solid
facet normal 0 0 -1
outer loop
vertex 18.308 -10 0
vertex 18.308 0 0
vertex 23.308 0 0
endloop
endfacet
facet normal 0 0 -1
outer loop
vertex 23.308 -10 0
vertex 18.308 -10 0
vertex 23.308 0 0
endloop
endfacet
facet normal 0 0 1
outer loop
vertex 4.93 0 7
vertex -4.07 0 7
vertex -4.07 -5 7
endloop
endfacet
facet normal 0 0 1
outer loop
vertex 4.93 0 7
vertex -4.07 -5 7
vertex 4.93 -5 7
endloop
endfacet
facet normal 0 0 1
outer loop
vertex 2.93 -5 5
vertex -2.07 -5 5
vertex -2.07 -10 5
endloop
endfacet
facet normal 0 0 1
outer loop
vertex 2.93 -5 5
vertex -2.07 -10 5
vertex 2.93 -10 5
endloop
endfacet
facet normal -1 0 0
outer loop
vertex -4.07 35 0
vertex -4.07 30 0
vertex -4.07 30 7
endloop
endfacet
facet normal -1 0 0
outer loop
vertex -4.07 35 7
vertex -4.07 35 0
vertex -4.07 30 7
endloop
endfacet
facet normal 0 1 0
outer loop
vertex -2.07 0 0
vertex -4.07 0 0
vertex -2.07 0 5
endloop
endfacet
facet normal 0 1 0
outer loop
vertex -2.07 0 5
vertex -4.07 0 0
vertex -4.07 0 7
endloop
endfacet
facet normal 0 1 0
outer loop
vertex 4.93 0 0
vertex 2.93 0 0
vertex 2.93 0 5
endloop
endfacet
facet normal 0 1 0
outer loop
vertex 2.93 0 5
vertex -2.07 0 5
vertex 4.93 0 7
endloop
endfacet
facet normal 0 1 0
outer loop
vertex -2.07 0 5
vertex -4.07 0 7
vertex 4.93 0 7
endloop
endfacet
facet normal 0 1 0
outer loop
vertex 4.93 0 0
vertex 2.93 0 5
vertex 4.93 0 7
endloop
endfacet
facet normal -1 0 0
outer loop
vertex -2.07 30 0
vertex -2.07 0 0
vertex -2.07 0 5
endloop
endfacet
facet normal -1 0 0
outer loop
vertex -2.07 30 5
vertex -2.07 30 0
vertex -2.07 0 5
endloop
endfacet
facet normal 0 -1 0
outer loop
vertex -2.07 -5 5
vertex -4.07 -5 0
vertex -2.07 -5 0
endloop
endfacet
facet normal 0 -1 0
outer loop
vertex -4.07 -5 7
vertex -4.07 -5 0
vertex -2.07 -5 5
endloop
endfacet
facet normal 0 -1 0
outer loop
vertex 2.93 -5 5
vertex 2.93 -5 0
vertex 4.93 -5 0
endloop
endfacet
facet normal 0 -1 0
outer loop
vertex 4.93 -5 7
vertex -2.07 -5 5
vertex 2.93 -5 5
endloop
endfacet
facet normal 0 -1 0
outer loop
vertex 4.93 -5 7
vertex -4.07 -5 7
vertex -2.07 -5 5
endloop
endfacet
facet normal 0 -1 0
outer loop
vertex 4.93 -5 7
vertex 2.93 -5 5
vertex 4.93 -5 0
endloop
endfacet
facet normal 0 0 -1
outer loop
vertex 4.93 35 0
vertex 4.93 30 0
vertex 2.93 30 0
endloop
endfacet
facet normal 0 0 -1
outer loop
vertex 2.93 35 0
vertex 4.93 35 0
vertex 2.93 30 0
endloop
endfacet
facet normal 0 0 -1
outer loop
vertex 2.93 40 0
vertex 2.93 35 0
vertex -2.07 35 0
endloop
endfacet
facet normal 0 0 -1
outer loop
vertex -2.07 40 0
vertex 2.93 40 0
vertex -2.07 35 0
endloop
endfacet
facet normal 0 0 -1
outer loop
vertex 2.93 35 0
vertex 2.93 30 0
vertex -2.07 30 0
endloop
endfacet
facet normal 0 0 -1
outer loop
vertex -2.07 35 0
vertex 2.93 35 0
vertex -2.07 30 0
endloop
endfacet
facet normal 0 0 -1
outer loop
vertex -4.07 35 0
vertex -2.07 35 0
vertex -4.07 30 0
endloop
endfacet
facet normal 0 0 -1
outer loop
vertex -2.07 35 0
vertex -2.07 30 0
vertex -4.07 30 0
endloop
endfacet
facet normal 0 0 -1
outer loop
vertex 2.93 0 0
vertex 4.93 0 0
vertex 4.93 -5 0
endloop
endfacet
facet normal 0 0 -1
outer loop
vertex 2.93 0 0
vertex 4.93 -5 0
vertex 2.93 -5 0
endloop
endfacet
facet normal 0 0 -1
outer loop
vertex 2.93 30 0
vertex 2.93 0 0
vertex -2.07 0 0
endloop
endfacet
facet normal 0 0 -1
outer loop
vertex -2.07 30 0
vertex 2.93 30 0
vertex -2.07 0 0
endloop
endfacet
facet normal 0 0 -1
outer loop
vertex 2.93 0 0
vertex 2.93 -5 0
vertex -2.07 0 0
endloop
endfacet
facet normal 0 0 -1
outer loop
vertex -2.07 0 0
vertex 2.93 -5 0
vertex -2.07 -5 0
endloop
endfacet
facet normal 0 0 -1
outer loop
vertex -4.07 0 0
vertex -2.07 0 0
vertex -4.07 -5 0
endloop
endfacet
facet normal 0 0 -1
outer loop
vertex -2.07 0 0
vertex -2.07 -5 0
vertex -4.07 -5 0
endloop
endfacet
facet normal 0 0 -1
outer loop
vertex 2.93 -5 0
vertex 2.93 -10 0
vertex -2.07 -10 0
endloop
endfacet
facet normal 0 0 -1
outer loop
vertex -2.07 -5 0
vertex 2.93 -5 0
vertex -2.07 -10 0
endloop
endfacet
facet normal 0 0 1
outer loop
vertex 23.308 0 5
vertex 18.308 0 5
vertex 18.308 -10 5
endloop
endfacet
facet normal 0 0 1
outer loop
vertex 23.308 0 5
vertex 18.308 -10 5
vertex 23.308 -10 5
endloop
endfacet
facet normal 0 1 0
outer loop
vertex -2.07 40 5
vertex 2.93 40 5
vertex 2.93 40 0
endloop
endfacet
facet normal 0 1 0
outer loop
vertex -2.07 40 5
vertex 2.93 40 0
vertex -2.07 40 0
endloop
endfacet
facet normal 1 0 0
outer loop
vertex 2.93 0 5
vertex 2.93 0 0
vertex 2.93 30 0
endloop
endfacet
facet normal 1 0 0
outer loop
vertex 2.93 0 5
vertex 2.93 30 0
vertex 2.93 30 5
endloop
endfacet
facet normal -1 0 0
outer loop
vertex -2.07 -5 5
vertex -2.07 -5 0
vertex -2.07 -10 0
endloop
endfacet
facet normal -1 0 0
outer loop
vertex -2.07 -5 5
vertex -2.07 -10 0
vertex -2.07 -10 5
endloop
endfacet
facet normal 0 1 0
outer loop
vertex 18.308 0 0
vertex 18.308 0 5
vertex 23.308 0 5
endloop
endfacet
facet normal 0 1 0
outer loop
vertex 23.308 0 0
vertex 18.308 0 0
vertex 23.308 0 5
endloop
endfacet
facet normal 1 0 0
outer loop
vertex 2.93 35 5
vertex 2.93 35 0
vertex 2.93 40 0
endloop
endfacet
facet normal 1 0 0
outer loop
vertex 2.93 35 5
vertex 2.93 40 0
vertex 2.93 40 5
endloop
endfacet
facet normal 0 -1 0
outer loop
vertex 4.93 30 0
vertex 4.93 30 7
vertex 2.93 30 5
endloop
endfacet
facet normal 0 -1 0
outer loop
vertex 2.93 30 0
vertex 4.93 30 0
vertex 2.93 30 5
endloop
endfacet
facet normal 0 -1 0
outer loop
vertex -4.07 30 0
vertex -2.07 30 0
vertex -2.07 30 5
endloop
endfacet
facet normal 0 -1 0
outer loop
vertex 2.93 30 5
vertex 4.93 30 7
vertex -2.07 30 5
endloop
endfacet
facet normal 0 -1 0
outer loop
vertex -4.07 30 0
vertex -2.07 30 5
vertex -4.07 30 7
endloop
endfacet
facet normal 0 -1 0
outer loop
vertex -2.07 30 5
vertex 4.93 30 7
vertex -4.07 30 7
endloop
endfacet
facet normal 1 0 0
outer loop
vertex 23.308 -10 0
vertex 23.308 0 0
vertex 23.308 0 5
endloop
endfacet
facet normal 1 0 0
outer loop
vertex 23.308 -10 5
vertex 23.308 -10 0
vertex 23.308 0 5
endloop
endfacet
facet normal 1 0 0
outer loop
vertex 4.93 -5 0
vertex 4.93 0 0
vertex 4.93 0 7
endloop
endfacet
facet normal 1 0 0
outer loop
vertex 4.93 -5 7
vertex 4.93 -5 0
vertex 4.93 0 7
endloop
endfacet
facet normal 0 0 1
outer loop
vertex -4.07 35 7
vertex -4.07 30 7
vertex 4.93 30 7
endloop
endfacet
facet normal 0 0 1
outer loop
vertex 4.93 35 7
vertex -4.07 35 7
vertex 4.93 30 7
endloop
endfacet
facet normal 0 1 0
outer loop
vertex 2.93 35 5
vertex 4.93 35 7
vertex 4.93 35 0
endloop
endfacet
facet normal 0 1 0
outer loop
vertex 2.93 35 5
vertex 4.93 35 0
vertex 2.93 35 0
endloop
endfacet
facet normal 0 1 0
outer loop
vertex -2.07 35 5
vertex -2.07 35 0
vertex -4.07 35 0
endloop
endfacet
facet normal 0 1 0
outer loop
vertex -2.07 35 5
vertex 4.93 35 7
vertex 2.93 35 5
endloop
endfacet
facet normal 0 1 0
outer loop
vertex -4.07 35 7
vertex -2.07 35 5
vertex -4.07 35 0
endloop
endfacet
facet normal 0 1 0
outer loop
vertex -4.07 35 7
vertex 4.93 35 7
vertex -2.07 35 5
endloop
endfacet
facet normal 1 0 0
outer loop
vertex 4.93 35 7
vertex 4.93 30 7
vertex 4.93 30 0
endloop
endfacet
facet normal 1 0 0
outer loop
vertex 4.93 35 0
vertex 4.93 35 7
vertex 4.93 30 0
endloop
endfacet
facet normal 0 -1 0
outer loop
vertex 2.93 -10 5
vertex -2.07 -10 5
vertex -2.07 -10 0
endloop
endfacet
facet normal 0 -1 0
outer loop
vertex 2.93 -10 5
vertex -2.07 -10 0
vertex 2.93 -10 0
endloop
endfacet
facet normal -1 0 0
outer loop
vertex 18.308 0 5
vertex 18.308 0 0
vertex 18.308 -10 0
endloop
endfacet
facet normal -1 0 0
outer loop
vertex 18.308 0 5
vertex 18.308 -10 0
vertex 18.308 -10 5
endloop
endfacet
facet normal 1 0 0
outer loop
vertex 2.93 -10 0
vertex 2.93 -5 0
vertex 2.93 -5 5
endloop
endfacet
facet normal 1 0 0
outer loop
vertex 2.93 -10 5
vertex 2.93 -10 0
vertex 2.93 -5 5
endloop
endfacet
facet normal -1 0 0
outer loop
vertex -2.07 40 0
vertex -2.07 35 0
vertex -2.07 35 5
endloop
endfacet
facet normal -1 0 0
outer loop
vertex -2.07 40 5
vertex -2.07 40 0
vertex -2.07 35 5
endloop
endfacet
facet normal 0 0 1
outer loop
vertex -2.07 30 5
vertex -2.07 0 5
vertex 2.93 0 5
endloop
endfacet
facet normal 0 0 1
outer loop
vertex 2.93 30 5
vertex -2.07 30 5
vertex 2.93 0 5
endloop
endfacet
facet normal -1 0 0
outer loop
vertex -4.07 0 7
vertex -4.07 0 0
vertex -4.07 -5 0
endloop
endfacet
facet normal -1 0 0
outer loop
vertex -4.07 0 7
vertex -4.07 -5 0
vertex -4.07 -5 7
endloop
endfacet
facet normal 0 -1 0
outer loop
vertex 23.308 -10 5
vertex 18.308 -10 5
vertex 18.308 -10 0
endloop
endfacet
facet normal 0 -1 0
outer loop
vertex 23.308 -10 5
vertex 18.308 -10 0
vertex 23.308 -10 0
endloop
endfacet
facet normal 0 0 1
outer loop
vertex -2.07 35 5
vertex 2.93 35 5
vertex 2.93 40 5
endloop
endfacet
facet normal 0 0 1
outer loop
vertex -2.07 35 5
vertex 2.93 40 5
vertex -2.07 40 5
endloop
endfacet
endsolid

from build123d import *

# Parameters (mm, degrees)
F0_W      = 9
F0_H      = 7
F1_DEPTH  = 5
F2_W      = 5
F2_H      = 5
F3_DEPTH  = 5
F4_W      = 5
F4_H      = 5
F5_DEPTH  = 30
F6_W      = 5
F6_H      = 5
F7_DEPTH  = 5
F8_W      = 5
F8_H      = 5
F9_DEPTH  = 5
F10_W     = 5
F10_H     = 5
F11_DEPTH = 10


with BuildPart() as f1:
    # F0 (on Front) → F1 (new body)
    with BuildSketch(Plane.XZ):
        with Locations((0.430352969, 3.5)):
            Rectangle(F0_W, F0_H)
    extrude(amount=F1_DEPTH)

    # F2 (on face) → F3 (join)
    with BuildSketch(Plane.XZ.offset(5)):
        with Locations((0.430352969, 2.5)):
            Rectangle(F2_W, F2_H)
    extrude(amount=F3_DEPTH)

    # F4 (on face) → F5 (join)
    with BuildSketch(Plane.XZ):
        with Locations((0.430352969, 2.5)):
            Rectangle(F4_W, F4_H)
    extrude(amount=-F5_DEPTH)

    # F6 (on face) → F7 (join)
    with BuildSketch(Plane(origin=(0, 30, 0), x_dir=(-1, 0, 0), z_dir=(0, 1, 0))):
        Polygon((-4.930352969, 7), (-4.930352969, 0), (-2.930352969, 0), (-2.930352969, 5), (2.069647031, 5), (2.069647031, 0), (4.069647031, 0), (4.069647031, 7), align=None)
        with Locations((-0.430352969, 2.5)):
            Rectangle(F6_W, F6_H)
    extrude(amount=F7_DEPTH)

    # F8 (on face) → F9 (join)
    with BuildSketch(Plane(origin=(0, 35, 0), x_dir=(-1, 0, 0), z_dir=(0, 1, 0))):
        with Locations((-0.430352969, 2.5)):
            Rectangle(F8_W, F8_H)
    extrude(amount=F9_DEPTH)


with BuildPart() as f11:
    # F10 (on Front) → F11 (new body)
    with BuildSketch(Plane.XZ):
        with Locations((20.8084413492, 2.5)):
            Rectangle(F10_W, F10_H)
    extrude(amount=F11_DEPTH)


solid = Compound([f1.part, f11.part])
